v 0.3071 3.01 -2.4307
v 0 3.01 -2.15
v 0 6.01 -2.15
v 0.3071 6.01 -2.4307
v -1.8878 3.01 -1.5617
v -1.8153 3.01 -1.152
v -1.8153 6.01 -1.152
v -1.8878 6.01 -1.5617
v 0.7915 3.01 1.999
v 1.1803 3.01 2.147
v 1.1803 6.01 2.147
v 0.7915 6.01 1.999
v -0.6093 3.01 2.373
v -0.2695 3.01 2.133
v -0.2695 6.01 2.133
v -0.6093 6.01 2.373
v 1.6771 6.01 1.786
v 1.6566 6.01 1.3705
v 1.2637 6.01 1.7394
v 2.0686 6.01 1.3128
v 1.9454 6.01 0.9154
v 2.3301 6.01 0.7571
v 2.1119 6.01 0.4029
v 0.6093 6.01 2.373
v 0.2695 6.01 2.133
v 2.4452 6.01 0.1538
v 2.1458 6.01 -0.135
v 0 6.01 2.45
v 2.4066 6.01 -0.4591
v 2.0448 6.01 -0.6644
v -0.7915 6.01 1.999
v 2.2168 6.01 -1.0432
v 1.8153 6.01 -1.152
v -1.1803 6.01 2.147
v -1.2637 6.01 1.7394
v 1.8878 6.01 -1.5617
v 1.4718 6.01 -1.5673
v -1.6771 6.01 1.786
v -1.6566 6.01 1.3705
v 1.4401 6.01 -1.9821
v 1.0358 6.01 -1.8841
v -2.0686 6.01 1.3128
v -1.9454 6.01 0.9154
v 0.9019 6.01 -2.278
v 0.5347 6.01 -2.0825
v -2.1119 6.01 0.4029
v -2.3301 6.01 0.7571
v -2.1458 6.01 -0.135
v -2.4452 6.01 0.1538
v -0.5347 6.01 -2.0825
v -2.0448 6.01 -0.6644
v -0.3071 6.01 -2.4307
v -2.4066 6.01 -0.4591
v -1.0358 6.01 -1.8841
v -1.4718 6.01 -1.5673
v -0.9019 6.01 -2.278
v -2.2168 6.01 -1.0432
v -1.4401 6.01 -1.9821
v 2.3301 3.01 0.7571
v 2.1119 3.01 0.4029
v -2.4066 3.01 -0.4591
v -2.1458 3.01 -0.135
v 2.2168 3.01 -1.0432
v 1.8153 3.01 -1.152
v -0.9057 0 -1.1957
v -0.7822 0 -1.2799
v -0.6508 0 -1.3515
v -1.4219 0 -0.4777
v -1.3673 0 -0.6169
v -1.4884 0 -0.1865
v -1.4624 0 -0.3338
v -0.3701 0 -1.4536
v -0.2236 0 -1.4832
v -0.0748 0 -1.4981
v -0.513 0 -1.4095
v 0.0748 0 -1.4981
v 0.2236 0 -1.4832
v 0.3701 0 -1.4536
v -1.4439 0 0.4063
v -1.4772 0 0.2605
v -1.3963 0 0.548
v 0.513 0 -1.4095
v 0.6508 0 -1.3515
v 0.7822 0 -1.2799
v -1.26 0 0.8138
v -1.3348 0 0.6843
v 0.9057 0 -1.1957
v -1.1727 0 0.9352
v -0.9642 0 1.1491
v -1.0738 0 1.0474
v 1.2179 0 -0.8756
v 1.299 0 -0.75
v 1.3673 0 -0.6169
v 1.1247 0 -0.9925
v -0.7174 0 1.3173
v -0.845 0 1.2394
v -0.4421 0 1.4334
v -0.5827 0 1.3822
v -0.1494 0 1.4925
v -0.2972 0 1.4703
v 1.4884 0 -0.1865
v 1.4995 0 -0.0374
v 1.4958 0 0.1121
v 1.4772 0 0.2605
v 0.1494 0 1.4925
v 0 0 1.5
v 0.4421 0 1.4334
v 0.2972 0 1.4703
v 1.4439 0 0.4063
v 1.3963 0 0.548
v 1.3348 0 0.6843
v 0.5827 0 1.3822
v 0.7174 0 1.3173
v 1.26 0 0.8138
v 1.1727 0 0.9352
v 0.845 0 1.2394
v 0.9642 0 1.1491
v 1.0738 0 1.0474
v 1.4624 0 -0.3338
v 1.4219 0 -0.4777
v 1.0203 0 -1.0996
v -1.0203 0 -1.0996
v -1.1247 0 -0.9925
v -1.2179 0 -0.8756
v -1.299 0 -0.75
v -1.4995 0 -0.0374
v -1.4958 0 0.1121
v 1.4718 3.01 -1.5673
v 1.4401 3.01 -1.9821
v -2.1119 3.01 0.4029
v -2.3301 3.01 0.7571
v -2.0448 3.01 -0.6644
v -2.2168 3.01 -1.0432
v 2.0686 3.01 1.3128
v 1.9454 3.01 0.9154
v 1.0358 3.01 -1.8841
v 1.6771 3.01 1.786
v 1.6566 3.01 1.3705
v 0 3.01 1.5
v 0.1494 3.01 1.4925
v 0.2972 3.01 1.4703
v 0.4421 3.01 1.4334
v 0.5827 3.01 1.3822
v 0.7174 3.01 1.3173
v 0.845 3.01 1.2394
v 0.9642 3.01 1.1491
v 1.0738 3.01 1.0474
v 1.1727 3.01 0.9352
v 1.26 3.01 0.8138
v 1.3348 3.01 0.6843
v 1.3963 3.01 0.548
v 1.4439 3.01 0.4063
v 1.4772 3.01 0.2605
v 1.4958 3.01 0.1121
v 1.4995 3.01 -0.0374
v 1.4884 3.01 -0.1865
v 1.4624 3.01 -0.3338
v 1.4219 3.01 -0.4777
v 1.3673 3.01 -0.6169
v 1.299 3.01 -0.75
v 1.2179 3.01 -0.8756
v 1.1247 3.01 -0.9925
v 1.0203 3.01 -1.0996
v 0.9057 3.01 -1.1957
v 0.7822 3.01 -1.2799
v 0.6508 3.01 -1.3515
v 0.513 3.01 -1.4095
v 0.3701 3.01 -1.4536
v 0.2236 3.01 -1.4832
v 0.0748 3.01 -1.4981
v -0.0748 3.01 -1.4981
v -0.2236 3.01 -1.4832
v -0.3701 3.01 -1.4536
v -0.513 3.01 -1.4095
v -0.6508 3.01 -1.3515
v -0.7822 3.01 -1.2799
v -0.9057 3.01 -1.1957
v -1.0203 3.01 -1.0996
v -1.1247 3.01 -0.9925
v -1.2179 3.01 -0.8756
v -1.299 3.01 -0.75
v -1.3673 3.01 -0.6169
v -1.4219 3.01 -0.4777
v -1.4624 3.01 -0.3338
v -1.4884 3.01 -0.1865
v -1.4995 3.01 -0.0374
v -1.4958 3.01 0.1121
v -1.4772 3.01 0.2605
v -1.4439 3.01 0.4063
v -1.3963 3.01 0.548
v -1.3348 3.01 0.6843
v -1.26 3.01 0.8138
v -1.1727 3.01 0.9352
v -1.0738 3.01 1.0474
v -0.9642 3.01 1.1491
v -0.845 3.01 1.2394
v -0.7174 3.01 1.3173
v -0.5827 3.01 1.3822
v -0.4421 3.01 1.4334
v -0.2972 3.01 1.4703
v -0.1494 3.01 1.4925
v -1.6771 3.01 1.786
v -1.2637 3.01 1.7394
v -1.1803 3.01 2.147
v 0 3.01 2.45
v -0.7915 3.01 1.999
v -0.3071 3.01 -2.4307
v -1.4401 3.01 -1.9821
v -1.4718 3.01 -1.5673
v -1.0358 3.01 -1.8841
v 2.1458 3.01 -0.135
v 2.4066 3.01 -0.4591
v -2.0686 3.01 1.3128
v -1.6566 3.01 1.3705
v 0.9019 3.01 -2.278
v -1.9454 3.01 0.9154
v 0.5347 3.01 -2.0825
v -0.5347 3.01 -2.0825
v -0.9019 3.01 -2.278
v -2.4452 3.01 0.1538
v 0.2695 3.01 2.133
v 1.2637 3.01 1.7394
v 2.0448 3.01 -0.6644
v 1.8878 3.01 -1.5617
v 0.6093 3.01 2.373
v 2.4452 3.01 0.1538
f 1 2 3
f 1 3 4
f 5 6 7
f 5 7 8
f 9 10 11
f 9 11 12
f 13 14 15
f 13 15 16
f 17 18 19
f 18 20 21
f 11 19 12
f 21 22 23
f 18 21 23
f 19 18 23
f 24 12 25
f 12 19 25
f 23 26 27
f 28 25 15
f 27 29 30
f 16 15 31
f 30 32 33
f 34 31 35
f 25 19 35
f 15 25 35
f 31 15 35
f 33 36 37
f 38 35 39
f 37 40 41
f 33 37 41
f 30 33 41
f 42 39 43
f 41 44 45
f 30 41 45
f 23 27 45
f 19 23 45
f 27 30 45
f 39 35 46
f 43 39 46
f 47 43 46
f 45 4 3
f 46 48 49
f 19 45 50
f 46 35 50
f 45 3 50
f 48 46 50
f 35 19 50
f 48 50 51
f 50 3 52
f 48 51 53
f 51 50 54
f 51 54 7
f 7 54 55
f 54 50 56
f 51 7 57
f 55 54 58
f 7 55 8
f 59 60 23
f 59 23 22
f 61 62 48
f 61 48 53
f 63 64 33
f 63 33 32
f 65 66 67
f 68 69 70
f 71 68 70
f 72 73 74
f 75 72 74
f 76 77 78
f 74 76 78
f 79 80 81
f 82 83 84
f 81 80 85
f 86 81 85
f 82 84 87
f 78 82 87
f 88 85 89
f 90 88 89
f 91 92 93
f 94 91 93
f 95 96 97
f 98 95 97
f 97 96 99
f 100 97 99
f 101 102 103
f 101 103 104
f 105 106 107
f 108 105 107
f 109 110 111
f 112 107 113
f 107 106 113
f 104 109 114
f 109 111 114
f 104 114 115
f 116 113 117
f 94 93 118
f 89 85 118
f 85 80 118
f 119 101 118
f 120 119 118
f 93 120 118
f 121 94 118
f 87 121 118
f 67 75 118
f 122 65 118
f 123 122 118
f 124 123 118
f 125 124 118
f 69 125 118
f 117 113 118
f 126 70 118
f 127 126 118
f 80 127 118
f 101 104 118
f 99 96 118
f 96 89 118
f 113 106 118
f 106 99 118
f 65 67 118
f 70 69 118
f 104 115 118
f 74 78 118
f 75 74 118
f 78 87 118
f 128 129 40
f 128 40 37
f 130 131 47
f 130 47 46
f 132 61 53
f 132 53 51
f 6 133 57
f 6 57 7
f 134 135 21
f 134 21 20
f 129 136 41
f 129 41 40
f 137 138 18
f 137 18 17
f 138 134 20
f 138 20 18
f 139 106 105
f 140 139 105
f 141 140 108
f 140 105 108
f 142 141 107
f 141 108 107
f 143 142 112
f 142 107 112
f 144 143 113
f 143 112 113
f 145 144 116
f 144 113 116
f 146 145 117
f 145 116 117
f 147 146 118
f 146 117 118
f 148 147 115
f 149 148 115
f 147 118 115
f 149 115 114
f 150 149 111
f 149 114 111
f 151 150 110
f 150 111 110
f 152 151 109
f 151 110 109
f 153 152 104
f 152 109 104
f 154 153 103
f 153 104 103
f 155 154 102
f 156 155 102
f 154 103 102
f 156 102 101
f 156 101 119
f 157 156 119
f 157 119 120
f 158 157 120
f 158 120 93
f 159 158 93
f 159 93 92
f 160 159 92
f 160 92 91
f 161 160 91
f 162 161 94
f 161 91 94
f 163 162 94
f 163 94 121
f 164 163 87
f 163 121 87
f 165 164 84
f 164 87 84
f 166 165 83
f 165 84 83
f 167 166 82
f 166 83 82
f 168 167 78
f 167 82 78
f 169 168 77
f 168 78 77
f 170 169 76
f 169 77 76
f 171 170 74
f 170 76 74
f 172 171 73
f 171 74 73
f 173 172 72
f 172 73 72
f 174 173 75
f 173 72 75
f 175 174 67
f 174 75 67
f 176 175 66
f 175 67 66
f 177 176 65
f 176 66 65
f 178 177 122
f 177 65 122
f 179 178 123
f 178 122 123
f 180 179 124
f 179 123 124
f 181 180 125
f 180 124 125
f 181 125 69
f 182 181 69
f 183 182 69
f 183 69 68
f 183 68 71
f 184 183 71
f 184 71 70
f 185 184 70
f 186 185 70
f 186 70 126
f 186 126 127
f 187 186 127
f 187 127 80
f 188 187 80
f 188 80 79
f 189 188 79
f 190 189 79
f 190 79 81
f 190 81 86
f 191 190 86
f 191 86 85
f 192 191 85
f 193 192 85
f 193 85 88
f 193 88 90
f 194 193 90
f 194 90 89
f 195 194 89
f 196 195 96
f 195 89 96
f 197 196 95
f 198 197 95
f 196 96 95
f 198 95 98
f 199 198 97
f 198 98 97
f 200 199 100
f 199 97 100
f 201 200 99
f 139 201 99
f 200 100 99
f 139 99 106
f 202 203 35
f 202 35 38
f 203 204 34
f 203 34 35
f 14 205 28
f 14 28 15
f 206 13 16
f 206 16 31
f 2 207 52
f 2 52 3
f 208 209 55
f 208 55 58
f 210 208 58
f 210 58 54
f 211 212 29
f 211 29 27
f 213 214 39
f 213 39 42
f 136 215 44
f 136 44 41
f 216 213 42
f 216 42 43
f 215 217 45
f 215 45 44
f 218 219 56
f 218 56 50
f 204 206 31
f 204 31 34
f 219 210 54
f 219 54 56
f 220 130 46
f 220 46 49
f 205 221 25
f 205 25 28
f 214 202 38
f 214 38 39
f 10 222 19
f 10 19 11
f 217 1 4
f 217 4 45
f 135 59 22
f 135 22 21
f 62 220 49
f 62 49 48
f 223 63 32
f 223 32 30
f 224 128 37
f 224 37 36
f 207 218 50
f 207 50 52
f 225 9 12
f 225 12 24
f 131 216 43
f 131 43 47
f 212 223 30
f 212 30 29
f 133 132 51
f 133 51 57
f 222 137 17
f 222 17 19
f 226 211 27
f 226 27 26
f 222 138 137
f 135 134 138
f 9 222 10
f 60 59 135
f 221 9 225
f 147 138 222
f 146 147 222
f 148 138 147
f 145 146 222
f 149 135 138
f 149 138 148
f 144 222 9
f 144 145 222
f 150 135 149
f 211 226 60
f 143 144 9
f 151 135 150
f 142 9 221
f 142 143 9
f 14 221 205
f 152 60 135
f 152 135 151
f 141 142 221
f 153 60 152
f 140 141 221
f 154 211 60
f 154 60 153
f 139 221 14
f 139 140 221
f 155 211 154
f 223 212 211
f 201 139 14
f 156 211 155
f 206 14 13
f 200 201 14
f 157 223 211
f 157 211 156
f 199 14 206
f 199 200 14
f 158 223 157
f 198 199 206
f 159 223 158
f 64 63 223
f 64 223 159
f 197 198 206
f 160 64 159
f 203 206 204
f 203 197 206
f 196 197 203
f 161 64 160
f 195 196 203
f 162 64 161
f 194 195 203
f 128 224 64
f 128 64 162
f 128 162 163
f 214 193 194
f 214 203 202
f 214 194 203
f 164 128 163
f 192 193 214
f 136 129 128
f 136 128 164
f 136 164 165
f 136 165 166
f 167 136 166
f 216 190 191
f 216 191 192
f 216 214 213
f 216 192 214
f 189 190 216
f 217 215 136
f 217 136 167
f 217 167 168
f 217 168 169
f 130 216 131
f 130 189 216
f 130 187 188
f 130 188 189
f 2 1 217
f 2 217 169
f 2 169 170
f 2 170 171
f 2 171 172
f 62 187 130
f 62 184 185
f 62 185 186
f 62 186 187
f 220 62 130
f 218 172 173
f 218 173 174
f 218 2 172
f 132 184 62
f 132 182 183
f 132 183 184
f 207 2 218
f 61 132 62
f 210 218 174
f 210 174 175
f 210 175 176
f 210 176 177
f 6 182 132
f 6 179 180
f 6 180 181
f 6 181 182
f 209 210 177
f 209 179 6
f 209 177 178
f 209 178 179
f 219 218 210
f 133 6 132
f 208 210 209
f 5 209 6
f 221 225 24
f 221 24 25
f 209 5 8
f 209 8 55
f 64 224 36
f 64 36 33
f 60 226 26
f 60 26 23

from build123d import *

# Parameters (mm, degrees)
SKETCH1_R           = 1.5
BOSS_EXTRUDE1_DEPTH = 3.01
BOSS_EXTRUDE2_DEPTH = 3


with BuildPart() as part:
    # Sketch1 → Boss-Extrude1 (new body)
    with BuildSketch(Plane(origin=(0, 0, 0), x_dir=(1, 0, 0), z_dir=(0, 1, 0))):
        with Locations(Location((0, 0, 0), (0, 0, 270))):
            Circle(SKETCH1_R)
    extrude(amount=BOSS_EXTRUDE1_DEPTH)

    # Sketch2 → Boss-Extrude2 (add)
    with BuildSketch(Plane(origin=(0, 3.01, 0), x_dir=(1, 0, 0), z_dir=(0, 1, 0))):
        Polygon((0.307066422, 2.430681018), (0.534683257, 2.082453796), (0.901905154, 2.27795239), (1.035770399, 1.884059362), (1.440073868, 1.982091636), (1.471776278, 1.567282549), (1.887757445, 1.561688775), (1.81530504, 1.152027609), (2.216826279, 1.043159264), (2.04477151, 0.664386538), (2.406603764, 0.459084221), (2.145757466, 0.134999617), (2.445165485, -0.153836773), (2.111917589, -0.402869826), (2.330088465, -0.757091636), (1.945378163, -0.915425477), (2.068603417, -1.312775648), (1.656603472, -1.370461578), (1.67714041, -1.785973137), (1.263738292, -1.739386538), (1.180296502, -2.146951366), (0.791467788, -1.999019445), (0.609290224, -2.373028745), (0.269466452, -2.133046608), (0, -2.45), (-0.269466452, -2.133046608), (-0.609290224, -2.373028745), (-0.791467788, -1.999019445), (-1.180296502, -2.146951366), (-1.263738292, -1.739386538), (-1.67714041, -1.785973137), (-1.656603472, -1.370461578), (-2.068603417, -1.312775648), (-1.945378163, -0.915425477), (-2.330088465, -0.757091636), (-2.111917589, -0.402869826), (-2.445165485, -0.153836773), (-2.145757466, 0.134999617), (-2.406603764, 0.459084221), (-2.04477151, 0.664386538), (-2.216826279, 1.043159264), (-1.81530504, 1.152027609), (-1.887757445, 1.561688775), (-1.471776278, 1.567282549), (-1.440073868, 1.982091636), (-1.035770399, 1.884059362), (-0.901905154, 2.27795239), (-0.534683257, 2.082453796), (-0.307066422, 2.430681018), (0, 2.15), align=None)
    extrude(amount=BOSS_EXTRUDE2_DEPTH)


solid = part.part
